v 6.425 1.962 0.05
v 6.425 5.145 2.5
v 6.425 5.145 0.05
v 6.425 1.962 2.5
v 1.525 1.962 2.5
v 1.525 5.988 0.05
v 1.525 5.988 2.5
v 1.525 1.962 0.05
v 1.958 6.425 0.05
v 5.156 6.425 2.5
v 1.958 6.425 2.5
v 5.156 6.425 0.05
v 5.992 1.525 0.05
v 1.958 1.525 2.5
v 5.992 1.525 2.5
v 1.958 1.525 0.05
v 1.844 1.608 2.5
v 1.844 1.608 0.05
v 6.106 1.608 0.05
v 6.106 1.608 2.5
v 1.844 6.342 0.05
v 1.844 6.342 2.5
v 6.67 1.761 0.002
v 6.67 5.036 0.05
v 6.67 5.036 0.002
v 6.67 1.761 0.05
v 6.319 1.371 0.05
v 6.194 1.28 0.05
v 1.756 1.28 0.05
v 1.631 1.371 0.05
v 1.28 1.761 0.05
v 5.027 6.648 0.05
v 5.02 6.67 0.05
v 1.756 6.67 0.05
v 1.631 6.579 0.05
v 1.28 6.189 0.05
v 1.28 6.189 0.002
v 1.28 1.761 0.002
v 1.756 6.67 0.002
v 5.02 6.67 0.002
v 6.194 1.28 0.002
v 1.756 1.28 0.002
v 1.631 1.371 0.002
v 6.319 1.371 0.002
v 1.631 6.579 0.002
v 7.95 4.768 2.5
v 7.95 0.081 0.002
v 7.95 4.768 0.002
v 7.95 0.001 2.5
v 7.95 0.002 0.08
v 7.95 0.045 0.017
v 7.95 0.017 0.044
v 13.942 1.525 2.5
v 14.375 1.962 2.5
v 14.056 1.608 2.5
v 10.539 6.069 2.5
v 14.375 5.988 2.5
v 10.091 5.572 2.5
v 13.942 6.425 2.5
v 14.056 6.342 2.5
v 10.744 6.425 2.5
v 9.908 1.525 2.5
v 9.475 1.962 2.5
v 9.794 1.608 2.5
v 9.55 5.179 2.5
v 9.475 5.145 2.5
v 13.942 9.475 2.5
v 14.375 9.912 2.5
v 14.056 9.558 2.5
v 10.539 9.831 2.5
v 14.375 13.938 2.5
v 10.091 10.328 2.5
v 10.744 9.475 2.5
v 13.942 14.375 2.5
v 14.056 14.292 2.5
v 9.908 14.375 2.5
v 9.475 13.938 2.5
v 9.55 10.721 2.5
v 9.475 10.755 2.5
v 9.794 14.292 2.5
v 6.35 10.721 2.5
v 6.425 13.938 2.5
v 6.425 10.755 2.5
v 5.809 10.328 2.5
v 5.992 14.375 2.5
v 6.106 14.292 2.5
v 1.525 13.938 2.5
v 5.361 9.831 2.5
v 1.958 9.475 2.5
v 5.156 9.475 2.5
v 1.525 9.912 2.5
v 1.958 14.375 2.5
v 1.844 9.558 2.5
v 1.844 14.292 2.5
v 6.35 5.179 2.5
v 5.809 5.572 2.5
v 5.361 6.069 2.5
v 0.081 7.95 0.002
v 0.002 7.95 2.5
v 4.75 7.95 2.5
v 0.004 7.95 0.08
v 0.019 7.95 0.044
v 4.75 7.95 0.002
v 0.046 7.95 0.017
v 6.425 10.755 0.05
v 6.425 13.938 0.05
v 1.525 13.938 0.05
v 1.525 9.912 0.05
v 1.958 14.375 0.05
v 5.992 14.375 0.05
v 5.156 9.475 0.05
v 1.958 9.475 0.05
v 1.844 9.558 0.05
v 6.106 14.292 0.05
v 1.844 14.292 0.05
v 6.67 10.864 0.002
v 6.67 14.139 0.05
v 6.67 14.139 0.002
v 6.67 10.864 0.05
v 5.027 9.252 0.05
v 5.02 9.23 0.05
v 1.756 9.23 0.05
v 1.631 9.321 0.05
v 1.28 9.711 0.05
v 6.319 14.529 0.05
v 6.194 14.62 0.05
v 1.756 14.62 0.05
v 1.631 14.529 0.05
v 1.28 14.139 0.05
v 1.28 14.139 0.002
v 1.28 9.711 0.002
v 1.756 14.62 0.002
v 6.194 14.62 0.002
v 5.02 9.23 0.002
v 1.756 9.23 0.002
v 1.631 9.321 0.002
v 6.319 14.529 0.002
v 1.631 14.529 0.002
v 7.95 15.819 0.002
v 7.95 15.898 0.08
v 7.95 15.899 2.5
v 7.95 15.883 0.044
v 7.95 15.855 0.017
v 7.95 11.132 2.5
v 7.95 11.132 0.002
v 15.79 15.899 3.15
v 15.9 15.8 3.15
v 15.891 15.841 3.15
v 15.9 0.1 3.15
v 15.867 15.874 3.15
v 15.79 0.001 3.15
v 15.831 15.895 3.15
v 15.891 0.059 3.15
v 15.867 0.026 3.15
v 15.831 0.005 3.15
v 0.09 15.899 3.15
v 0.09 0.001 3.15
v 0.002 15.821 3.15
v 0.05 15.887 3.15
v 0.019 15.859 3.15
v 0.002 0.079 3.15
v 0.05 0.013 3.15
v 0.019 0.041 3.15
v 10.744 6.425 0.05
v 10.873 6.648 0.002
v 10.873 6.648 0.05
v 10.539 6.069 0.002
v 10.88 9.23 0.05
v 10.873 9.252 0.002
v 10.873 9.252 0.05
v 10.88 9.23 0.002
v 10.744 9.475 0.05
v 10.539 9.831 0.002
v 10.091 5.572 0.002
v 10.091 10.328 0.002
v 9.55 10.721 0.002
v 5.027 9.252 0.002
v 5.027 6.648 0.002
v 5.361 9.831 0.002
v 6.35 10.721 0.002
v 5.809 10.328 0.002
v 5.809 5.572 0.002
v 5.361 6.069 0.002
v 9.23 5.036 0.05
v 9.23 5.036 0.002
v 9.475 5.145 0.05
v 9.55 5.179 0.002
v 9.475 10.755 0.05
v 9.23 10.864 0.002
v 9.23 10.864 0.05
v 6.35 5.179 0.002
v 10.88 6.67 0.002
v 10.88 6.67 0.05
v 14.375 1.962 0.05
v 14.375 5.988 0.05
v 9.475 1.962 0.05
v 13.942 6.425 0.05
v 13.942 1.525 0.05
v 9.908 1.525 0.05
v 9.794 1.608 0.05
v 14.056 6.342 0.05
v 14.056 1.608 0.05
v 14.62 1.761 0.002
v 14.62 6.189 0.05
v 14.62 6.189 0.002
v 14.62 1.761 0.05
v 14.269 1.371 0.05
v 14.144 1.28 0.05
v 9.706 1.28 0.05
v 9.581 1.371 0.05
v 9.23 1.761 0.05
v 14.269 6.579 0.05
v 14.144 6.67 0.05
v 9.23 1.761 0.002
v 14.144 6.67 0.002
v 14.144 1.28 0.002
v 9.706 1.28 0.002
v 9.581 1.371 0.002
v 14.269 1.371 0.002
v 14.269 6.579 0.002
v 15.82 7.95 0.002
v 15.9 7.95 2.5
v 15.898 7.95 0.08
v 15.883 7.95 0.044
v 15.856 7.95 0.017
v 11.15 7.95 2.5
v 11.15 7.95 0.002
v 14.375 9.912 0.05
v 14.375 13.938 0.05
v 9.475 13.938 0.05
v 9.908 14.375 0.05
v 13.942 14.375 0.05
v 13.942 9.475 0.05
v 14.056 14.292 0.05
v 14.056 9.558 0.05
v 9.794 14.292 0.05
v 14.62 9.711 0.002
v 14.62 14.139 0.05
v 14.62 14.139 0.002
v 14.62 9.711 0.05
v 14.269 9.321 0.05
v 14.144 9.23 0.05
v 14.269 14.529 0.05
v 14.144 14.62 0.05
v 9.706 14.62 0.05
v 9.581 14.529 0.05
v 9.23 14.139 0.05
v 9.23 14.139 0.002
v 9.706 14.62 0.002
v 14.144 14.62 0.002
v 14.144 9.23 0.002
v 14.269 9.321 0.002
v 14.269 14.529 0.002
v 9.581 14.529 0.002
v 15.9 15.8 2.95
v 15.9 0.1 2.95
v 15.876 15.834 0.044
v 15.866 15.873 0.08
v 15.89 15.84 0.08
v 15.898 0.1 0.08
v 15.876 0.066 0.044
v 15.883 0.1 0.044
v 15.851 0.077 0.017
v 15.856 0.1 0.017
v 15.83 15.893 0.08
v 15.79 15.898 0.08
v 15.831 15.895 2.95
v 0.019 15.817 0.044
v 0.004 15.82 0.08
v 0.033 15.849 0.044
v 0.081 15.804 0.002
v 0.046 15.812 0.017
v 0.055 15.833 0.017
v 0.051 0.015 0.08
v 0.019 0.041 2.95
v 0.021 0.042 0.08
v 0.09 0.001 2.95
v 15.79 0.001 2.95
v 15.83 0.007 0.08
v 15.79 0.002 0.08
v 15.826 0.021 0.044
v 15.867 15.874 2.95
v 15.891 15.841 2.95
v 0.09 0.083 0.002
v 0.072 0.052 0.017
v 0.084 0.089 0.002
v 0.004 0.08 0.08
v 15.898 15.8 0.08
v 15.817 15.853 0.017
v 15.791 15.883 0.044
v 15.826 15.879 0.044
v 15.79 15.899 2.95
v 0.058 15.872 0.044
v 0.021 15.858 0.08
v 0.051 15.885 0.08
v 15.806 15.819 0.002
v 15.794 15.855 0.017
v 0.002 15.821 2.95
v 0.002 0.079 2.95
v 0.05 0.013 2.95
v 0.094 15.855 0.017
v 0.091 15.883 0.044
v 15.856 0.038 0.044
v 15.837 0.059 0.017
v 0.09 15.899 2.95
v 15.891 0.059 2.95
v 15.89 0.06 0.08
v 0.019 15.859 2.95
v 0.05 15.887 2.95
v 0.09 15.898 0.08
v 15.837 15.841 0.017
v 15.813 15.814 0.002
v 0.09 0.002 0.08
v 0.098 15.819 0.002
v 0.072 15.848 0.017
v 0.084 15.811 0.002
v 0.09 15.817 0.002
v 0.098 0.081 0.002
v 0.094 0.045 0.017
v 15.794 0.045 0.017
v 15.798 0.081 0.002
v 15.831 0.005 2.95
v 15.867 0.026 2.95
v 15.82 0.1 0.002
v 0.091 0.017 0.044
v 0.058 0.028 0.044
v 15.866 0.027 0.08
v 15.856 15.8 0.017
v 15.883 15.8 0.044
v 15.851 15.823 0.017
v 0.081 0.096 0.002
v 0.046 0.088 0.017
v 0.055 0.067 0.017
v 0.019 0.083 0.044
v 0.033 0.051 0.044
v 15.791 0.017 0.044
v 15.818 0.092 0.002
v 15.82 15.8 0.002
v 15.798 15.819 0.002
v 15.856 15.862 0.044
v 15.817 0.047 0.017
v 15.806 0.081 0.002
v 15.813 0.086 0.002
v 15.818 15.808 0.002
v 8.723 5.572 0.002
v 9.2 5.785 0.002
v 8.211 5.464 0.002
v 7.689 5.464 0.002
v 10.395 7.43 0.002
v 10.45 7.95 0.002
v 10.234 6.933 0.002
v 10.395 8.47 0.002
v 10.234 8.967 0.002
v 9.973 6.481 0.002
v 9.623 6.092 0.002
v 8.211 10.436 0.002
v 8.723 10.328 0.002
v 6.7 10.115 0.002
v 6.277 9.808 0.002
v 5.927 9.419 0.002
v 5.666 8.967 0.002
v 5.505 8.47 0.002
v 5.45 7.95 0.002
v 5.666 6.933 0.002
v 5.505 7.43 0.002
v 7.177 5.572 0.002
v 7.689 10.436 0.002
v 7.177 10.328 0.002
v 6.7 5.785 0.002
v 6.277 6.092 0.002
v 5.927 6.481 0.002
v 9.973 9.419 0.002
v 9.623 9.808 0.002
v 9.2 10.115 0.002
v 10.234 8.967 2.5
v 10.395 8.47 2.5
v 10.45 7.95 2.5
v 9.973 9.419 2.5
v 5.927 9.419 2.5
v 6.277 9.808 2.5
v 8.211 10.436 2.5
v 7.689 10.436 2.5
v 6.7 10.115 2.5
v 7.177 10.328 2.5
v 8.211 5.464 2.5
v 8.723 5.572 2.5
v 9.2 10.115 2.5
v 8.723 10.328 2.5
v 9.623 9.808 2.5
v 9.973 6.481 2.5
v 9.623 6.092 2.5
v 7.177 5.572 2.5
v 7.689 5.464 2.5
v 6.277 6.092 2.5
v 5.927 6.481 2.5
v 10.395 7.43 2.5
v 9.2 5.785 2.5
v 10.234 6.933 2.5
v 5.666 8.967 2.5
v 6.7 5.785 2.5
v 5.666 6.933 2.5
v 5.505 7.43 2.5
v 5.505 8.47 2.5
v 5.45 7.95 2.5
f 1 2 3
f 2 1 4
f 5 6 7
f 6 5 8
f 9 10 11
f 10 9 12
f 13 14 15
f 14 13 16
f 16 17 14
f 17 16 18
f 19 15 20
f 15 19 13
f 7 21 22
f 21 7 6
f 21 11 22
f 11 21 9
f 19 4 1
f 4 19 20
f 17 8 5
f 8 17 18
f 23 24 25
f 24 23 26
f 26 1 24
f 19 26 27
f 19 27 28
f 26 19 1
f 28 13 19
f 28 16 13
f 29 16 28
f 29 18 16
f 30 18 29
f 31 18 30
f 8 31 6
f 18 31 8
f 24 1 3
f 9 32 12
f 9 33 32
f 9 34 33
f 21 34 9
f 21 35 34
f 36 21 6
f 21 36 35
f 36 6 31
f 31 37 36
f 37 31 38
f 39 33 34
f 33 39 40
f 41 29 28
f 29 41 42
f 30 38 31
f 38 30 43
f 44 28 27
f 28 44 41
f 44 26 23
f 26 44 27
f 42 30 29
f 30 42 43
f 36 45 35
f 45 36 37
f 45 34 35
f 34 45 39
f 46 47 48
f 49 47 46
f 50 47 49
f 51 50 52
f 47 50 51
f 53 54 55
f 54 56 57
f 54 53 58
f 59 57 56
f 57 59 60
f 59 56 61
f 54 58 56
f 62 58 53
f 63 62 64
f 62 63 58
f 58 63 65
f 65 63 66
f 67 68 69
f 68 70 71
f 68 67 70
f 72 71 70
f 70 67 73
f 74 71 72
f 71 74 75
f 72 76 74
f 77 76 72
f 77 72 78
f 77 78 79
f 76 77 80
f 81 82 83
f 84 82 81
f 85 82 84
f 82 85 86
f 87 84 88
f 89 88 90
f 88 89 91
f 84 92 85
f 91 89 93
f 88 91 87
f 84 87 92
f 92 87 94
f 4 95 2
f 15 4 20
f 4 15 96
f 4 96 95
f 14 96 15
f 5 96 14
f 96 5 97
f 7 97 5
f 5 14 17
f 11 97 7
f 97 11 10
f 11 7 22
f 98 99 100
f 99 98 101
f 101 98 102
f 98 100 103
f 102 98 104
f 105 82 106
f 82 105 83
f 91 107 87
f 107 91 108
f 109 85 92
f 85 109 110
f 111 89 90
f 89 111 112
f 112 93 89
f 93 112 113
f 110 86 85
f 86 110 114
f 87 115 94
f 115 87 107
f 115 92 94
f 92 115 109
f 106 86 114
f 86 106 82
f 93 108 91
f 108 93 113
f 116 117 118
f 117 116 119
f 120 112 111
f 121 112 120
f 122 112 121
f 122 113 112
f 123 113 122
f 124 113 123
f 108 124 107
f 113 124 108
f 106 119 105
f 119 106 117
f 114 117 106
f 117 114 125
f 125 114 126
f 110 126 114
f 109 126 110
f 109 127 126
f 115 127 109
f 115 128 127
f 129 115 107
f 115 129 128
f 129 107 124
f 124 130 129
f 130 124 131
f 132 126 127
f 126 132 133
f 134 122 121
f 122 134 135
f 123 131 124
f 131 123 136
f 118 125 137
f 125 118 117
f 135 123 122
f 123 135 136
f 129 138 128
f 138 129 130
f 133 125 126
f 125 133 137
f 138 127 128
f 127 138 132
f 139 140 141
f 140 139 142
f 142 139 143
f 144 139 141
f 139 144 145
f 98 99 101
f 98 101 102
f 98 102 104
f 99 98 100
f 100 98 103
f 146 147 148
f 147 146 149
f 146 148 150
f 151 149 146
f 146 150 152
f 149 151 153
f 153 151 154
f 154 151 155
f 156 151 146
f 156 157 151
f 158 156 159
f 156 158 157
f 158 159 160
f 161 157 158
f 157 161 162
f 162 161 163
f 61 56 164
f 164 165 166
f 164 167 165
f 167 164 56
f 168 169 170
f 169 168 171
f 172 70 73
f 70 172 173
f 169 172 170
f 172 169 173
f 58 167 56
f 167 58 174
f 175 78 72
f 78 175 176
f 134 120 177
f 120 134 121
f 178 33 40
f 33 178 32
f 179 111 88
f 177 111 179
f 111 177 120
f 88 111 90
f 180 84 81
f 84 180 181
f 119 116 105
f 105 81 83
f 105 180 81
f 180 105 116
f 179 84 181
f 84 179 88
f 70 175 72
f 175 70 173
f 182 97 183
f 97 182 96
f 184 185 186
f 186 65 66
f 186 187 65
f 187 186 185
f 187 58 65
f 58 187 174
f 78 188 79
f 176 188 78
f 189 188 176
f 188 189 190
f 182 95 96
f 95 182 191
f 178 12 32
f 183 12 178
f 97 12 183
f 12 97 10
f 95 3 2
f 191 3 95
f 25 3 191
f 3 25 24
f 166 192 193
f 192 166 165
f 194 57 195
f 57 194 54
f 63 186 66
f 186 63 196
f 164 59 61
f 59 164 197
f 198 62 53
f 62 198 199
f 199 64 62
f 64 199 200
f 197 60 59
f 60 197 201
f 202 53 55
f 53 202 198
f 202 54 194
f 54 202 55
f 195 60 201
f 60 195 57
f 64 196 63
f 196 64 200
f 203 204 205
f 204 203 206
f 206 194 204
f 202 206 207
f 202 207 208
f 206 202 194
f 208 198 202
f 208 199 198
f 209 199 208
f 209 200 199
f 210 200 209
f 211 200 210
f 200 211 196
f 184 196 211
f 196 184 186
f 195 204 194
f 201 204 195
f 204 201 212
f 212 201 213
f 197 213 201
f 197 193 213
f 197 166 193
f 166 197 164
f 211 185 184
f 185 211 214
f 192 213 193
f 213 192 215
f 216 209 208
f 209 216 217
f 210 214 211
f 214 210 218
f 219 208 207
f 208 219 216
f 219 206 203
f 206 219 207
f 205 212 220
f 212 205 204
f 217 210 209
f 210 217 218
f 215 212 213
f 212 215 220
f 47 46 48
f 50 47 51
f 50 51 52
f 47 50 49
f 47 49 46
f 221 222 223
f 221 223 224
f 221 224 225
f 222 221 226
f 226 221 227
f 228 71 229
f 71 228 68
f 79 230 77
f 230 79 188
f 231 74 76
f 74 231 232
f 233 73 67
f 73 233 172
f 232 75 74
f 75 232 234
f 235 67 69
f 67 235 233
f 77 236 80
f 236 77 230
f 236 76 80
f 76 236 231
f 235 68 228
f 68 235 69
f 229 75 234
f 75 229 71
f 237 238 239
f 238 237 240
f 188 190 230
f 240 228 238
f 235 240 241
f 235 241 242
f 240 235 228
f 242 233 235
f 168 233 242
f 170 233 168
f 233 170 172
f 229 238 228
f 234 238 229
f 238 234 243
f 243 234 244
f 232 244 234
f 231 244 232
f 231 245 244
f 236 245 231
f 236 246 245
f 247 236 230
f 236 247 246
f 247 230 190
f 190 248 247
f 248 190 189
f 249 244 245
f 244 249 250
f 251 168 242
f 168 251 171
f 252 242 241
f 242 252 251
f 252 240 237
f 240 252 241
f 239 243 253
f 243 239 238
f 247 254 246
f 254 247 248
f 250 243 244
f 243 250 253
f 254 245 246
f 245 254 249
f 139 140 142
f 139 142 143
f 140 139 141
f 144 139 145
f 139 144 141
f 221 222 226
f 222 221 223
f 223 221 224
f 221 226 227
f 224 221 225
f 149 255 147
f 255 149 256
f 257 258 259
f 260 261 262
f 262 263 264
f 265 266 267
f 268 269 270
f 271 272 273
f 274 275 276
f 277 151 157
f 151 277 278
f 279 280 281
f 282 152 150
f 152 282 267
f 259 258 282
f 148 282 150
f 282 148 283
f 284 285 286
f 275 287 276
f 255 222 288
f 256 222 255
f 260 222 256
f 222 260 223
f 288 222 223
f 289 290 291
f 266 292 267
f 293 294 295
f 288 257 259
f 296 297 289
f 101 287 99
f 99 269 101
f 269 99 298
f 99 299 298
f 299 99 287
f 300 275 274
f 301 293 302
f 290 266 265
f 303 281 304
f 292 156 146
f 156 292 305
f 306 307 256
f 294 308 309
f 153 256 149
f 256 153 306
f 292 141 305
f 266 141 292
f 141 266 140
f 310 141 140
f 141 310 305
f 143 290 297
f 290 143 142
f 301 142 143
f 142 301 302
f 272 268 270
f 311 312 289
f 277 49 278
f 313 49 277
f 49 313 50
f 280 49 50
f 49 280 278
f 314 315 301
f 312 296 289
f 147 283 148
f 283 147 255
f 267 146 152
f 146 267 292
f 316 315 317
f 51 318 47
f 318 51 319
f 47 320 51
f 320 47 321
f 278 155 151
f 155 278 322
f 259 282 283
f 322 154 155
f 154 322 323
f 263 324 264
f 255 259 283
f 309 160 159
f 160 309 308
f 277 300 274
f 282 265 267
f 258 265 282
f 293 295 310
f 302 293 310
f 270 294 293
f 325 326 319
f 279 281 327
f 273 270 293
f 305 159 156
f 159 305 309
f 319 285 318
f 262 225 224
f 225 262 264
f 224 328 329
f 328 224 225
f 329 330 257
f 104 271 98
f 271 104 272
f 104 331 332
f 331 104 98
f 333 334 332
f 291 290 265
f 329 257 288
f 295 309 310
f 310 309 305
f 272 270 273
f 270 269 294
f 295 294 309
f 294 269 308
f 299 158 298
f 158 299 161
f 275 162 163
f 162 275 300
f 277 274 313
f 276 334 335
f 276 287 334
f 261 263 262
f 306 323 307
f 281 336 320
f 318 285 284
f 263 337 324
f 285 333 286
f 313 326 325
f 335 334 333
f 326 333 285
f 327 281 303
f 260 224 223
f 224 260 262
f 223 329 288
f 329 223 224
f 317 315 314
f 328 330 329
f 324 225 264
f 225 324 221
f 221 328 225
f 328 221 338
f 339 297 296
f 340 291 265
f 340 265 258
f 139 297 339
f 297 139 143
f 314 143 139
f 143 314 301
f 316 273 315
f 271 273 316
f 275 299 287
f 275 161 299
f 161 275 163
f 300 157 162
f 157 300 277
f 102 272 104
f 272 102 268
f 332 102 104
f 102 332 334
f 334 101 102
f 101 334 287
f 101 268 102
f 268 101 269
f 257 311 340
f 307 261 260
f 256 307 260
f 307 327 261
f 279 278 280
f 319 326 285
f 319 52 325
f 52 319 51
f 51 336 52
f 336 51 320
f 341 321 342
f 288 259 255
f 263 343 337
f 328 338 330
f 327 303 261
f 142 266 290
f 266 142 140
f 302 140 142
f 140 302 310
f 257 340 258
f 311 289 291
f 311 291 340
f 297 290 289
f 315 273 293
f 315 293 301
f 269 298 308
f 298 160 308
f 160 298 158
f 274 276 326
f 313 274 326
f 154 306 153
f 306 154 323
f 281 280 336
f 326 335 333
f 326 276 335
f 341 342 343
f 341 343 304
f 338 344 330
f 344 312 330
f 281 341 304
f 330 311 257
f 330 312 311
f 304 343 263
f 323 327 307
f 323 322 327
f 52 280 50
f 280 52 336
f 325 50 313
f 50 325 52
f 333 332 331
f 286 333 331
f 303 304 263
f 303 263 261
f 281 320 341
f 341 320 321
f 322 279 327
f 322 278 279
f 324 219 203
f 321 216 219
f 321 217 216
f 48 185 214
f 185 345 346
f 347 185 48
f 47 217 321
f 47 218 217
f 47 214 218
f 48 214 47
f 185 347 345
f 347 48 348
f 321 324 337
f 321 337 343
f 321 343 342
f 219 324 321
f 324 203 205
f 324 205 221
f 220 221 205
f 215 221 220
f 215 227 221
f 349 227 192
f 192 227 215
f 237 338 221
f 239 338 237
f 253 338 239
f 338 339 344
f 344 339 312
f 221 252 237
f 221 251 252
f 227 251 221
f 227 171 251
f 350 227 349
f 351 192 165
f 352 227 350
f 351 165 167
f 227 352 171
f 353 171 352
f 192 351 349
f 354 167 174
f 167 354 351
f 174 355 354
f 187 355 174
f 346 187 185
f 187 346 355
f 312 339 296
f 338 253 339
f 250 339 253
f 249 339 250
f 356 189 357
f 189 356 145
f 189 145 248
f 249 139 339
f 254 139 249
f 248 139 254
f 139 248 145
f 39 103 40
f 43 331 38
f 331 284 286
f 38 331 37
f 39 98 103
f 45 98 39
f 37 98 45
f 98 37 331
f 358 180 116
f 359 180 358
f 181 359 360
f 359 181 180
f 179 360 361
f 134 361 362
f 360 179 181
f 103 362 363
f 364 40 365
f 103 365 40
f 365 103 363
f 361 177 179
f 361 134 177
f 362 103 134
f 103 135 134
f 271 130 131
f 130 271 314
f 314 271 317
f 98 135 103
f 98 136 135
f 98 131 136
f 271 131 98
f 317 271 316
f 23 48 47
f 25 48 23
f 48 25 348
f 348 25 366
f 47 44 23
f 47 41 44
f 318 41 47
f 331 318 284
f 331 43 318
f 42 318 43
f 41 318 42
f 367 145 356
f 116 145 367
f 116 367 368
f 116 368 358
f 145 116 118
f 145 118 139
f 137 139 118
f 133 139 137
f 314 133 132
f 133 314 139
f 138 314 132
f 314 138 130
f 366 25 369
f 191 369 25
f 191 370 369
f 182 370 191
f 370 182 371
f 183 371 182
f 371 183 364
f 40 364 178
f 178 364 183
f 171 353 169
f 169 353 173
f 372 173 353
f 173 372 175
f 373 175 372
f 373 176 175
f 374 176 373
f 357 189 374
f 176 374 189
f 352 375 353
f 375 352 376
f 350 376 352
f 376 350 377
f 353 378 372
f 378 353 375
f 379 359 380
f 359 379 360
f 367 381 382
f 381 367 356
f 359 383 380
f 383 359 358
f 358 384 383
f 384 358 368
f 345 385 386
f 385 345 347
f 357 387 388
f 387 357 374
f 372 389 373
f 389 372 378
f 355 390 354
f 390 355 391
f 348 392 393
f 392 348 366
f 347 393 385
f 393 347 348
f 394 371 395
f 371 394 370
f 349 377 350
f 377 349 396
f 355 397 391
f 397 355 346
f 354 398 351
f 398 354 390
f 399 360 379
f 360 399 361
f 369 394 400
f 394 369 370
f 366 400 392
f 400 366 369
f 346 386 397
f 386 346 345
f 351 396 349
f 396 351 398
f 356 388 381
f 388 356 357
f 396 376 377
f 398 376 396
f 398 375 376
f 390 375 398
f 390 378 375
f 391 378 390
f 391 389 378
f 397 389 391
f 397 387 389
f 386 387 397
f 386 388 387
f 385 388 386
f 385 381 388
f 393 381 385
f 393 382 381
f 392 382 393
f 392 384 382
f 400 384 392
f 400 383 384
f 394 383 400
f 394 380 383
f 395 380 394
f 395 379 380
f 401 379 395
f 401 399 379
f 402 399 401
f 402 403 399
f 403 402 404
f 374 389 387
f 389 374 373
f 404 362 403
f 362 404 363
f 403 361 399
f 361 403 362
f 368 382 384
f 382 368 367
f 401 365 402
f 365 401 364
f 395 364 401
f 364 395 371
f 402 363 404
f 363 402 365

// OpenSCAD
// file: ../lib/roundedcube_simple.scad
module roundedcube_simple(size = [1, 1, 1], center = false, radius = 0.5, resolution = 20) {
	// If single value, convert to [x, y, z] vector
	size = (size[0] == undef) ? [size, size, size] : size;

	translate = (center == false) ?
		[radius, radius, radius] :
		[
			radius - (size[0] / 2),
			radius - (size[1] / 2),
			radius - (size[2] / 2)
	];

	translate(v = translate)
	minkowski() {
		cube(size = [
			size[0] - (radius * 2),
			size[1] - (radius * 2),
			size[2] - (radius * 2)
		]);
		sphere(r = radius, $fn = resolution);
	}
}
// file: ../lib/roundedcube.scad
// More information: https://danielupshaw.com/openscad-rounded-corners/

// Set to 0.01 for higher definition curves (renders slower)
$fs = 0.15;

module roundedcube(size = [1, 1, 1], center = false, radius = 0.5, apply_to = "all", resolution = 20) {
	// If single value, convert to [x, y, z] vector
	size = (size[0] == undef) ? [size, size, size] : size;

	translate_min = radius;
	translate_xmax = size[0] - radius;
	translate_ymax = size[1] - radius;
	translate_zmax = size[2] - radius;

	diameter = radius * 2;

	obj_translate = (center == false) ?
		[0, 0, 0] : [
			-(size[0] / 2),
			-(size[1] / 2),
			-(size[2] / 2)
		];

	translate(v = obj_translate) {
		hull() {
			for (translate_x = [translate_min, translate_xmax]) {
				x_at = (translate_x == translate_min) ? "min" : "max";
				for (translate_y = [translate_min, translate_ymax]) {
					y_at = (translate_y == translate_min) ? "min" : "max";
					for (translate_z = [translate_min, translate_zmax]) {
						z_at = (translate_z == translate_min) ? "min" : "max";

						translate(v = [translate_x, translate_y, translate_z])
						if (
							(apply_to == "all") ||
							(apply_to == "xmin" && x_at == "min") || (apply_to == "xmax" && x_at == "max") ||
							(apply_to == "ymin" && y_at == "min") || (apply_to == "ymax" && y_at == "max") ||
							(apply_to == "zmin" && z_at == "min") || (apply_to == "zmax" && z_at == "max")
						) {
							sphere(r = radius, $fn = resolution);
						} else {
							rotate = 
								(apply_to == "xmin" || apply_to == "xmax" || apply_to == "x") ? [0, 90, 0] : (
								(apply_to == "ymin" || apply_to == "ymax" || apply_to == "y") ? [90, 90, 0] :
								[0, 0, 0]
							);
							rotate(a = rotate)
							cylinder(h = diameter, r = radius, center = true, $fn = resolution);
						}
					}
				}
			}
		}
	}
}
// main file
echo(version=version());

include <../lib/block.scad>;

block(grid=[2,2], withKnobs=false);
